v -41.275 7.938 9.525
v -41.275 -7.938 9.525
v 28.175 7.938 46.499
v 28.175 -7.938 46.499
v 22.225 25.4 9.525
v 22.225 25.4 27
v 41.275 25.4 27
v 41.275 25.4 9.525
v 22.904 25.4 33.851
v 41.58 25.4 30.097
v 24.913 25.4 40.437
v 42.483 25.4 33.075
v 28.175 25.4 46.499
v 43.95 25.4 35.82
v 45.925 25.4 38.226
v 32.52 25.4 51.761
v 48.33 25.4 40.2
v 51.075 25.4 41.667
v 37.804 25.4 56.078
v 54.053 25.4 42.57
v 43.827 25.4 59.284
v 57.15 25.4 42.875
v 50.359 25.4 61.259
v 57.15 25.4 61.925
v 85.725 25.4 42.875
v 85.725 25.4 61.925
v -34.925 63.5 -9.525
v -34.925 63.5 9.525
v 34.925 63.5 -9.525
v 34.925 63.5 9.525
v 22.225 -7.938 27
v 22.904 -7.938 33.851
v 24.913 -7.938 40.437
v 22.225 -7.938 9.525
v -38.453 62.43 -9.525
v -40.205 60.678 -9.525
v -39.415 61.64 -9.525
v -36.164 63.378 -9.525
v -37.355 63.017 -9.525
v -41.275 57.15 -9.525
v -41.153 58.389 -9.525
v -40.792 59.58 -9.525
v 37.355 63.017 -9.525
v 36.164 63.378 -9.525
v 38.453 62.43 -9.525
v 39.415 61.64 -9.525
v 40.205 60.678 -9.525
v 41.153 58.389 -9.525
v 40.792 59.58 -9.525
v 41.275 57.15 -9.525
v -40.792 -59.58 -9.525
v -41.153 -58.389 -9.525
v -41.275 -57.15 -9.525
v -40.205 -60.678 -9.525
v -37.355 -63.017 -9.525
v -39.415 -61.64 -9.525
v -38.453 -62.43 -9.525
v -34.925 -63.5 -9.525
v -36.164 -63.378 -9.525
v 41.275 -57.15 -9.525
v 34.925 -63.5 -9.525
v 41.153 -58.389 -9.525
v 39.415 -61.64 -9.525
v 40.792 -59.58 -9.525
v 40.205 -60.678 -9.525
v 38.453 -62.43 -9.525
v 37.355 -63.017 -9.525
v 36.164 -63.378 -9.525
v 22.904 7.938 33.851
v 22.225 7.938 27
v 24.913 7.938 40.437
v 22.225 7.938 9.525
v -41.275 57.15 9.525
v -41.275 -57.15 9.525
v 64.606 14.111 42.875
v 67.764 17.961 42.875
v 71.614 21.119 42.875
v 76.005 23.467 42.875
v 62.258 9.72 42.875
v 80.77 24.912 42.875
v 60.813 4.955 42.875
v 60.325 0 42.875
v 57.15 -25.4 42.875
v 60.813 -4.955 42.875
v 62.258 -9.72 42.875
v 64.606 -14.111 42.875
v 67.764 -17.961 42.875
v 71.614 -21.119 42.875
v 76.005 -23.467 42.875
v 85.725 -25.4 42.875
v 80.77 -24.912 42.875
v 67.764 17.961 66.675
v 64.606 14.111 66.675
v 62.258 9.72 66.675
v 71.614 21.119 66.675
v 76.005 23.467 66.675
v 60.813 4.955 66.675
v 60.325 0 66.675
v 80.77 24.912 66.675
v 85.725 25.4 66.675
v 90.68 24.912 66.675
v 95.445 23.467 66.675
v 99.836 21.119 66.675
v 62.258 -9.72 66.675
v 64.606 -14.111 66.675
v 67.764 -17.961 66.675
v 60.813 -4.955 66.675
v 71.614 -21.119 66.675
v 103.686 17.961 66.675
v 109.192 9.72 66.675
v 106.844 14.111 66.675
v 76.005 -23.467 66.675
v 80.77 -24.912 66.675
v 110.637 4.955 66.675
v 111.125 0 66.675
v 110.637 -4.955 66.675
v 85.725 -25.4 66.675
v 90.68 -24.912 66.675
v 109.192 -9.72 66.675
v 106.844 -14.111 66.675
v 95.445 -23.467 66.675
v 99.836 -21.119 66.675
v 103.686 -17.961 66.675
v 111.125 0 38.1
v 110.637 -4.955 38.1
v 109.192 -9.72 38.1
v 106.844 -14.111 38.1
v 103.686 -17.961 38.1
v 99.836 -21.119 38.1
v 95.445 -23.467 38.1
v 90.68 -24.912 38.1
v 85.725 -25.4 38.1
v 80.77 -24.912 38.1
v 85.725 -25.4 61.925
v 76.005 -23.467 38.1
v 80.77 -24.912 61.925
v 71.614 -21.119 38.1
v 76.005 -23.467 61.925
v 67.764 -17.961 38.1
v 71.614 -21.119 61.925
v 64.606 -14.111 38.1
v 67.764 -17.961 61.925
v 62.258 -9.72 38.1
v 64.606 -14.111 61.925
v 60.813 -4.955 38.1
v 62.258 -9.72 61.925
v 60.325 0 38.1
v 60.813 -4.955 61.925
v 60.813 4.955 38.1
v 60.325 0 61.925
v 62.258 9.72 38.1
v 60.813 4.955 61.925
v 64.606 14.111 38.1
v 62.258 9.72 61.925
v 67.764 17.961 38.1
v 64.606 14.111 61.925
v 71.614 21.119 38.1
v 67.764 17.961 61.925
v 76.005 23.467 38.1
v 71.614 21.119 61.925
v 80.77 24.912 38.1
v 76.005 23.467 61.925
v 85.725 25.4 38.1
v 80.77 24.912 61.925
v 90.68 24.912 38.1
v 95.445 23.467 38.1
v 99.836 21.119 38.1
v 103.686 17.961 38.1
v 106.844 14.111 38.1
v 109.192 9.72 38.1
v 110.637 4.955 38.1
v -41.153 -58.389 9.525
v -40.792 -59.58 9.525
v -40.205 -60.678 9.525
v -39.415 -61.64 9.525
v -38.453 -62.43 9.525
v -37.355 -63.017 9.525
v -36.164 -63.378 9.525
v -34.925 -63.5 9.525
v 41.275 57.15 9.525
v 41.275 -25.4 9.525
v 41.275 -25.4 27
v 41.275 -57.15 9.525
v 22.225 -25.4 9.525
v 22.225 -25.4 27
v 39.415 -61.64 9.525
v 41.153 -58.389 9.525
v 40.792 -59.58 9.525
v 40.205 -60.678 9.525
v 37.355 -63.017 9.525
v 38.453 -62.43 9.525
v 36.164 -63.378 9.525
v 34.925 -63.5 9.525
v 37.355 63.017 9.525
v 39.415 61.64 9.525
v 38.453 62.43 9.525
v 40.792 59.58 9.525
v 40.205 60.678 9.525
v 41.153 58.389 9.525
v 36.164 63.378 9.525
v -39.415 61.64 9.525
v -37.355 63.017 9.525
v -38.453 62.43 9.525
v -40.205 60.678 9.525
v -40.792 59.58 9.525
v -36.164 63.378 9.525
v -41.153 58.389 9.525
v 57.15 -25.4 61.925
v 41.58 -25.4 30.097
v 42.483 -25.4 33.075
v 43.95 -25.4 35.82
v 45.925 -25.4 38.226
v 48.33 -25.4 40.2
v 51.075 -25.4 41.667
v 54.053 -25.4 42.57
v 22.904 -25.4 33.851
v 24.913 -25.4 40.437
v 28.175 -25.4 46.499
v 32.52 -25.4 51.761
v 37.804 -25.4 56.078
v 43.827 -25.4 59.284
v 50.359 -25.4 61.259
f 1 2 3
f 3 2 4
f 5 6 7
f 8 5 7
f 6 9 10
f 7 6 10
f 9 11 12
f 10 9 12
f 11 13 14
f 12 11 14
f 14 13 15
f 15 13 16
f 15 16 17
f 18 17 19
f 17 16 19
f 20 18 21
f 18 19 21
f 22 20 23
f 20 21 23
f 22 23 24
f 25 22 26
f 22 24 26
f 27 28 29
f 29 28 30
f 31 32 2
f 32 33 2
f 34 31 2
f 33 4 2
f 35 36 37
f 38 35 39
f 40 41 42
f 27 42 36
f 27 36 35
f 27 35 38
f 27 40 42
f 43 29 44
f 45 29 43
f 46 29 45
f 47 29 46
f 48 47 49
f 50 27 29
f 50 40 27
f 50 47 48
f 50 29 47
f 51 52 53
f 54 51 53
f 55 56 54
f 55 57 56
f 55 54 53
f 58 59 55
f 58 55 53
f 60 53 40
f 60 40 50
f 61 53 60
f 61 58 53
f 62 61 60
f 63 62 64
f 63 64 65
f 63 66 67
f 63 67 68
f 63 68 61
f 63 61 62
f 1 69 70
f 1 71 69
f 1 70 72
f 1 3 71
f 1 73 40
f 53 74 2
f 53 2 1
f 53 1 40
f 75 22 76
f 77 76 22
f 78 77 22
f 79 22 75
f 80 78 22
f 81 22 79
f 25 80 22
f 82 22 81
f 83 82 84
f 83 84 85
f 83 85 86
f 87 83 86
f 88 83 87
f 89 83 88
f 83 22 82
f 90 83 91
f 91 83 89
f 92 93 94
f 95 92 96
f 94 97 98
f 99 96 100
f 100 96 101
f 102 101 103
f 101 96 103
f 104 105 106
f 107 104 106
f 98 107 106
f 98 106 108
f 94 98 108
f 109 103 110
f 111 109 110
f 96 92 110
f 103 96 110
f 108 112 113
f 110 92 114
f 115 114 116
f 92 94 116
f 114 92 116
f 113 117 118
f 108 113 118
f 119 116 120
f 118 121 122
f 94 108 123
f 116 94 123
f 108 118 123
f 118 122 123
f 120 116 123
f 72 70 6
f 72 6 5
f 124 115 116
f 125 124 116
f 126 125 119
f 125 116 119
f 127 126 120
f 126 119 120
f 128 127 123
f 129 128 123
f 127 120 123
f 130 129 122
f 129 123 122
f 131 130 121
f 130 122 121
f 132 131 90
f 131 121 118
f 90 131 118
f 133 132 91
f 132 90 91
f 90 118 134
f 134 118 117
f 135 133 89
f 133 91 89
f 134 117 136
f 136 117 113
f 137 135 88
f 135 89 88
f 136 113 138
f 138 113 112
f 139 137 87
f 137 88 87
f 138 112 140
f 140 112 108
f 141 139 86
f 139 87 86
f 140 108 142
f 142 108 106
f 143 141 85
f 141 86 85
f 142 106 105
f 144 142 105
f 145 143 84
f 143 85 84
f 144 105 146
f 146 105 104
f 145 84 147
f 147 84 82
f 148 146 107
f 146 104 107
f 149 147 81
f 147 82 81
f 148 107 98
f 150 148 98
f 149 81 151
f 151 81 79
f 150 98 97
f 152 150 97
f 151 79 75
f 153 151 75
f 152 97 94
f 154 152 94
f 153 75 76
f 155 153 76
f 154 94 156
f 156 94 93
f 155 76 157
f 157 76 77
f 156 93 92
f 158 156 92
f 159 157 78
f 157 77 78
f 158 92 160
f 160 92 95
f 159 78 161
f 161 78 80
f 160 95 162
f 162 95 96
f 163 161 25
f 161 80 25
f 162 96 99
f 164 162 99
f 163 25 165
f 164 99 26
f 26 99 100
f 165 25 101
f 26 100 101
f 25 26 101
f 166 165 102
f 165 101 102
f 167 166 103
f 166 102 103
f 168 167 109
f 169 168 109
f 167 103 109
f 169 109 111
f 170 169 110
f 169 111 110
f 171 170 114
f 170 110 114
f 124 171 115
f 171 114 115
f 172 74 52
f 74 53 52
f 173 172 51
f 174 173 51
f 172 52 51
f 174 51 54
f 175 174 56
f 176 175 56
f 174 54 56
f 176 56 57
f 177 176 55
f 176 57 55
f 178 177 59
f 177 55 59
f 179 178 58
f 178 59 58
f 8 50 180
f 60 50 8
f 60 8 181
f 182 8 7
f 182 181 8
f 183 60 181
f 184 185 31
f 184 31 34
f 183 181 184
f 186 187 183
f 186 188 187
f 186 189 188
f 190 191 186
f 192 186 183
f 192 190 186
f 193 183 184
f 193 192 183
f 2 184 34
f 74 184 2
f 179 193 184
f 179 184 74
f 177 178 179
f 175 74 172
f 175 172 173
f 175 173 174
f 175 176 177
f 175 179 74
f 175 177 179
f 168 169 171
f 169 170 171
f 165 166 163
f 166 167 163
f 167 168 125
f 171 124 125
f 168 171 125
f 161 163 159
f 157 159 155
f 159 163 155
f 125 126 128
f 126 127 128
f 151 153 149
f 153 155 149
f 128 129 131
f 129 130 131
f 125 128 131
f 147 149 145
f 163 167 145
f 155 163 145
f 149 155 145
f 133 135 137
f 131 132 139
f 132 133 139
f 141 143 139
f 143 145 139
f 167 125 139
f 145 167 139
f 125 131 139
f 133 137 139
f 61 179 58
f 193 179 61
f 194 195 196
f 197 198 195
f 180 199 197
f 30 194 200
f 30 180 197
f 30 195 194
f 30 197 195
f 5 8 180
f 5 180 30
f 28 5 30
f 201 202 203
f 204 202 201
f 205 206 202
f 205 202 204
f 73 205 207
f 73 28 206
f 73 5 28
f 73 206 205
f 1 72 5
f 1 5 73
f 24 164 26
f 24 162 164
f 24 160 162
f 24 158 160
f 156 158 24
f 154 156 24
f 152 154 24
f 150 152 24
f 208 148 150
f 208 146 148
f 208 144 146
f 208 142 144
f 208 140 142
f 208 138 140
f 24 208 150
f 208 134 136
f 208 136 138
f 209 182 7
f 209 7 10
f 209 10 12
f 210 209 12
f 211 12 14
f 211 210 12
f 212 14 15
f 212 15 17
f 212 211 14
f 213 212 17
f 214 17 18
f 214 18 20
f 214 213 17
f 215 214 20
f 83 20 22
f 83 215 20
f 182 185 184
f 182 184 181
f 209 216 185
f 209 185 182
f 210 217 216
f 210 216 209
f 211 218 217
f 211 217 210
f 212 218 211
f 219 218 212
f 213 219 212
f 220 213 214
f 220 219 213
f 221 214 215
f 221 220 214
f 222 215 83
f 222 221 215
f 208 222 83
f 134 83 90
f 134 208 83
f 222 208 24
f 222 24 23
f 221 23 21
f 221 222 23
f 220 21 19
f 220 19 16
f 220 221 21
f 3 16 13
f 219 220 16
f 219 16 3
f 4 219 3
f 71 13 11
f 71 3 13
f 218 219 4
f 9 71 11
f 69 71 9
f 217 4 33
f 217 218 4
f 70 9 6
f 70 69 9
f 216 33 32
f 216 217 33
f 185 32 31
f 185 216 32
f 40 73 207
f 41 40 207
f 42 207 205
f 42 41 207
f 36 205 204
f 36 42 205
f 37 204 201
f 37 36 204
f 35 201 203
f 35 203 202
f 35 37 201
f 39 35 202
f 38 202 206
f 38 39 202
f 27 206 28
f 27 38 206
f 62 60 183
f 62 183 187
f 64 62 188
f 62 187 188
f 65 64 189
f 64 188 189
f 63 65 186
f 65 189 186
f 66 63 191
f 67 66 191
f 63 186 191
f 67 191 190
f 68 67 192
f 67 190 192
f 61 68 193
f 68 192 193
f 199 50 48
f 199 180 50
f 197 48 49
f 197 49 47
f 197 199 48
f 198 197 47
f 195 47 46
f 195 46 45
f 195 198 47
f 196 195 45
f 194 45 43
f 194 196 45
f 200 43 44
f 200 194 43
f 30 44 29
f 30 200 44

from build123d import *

# Parameters (mm, degrees)
F1_DEPTH = 63.5
F2_DEPTH = 25.4
F3_DEPTH = 7.9375
F5_R     = 6.35


with BuildPart() as f1:
    # F0 (on Front) → F1 (new body, symmetric)
    with BuildSketch(Plane.XZ):
        Polygon((22.225, 9.525), (-41.275, 9.525), (-41.275, -9.525), (41.275, -9.525), (41.275, 9.525), align=None)
    extrude(amount=F1_DEPTH, both=True)

    # F0 (on Front) → F2 (join, symmetric)
    with BuildSketch(Plane.XZ):
        Polygon((85.725, 61.9252), (60.325, 61.9252), (60.325, 42.8752), (80.5717907127, 42.8752), (85.725, 42.8752), align=None)
        with BuildLine():
            Line((22.225, 27.0002), (22.225, 9.525))
            Line((22.225, 9.525), (41.275, 9.525))
            Line((41.275, 9.525), (41.275, 27.0002))
            ThreePointArc((41.275, 27.0002), (45.9246798487, 38.2255201513), (57.15, 42.8752))
            Line((57.15, 42.8752), (60.325, 42.8752))
            Line((60.325, 42.8752), (60.325, 61.9252))
            Line((60.325, 61.9252), (57.15, 61.9252))
            add(Edge.make_bspline(
                [(28.1752493255, 46.4994166087), (37.8334995503, 51.6413444058), (47.4917497752, 56.7832722029), (57.15, 61.9252)],
                knots=[78.6793785876, 78.6793785876, 78.6793785876, 78.6793785876, 111.5045361635, 111.5045361635, 111.5045361635, 111.5045361635], degree=3))
            ThreePointArc((28.1752493255, 46.4994166087), (23.7456680032, 37.1936404813), (22.225, 27.0002))
        make_face()
        with BuildLine():
            ThreePointArc((57.15, 61.9252), (40.737421212, 57.8284805639), (28.1752493255, 46.4994166087))
            add(Edge.make_bspline(
                [(28.1752493255, 46.4994166087), (37.8334995503, 51.6413444058), (47.4917497752, 56.7832722029), (57.15, 61.9252)],
                knots=[78.6793785876, 78.6793785876, 78.6793785876, 78.6793785876, 111.5045361635, 111.5045361635, 111.5045361635, 111.5045361635], degree=3))
        make_face()
    extrude(amount=F2_DEPTH, both=True)

    # F0 (on Front) → F3 (join, symmetric)
    with BuildSketch(Plane.XZ):
        with BuildLine():
            add(Edge.make_bspline(
                [(-41.275, 9.525), (-18.1249168915, 21.8498055362), (5.025166217, 34.1746110724), (28.1752493255, 46.4994166087)],
                knots=[0, 0, 0, 0, 78.6793785876, 78.6793785876, 78.6793785876, 78.6793785876], degree=3))
            Line((-41.275, 9.525), (22.225, 9.525))
            Line((22.225, 9.525), (22.225, 27.0002))
            ThreePointArc((22.225, 27.0002), (23.7456680032, 37.1936404813), (28.1752493255, 46.4994166087))
        make_face()
    extrude(amount=F3_DEPTH, both=True)

    # F0 (on Front) → F4 (revolve)
    with BuildSketch(Plane.XZ):
        Polygon((85.725, 66.675), (85.725, 61.9252), (85.725, 42.8752), (85.725, 38.1), (111.125, 38.1), (111.125, 66.675), align=None)
    revolve(axis=Axis((85.725, 0, 52.3875), (0, 0, -1)))

    # F5
    f5_edges = [f1.edges().sort_by_distance(p)[0] for p in [
        (-41.275, -63.5, 0),
        (41.275, -63.5, 0),
        (41.275, 63.5, 0),
        (-41.275, 63.5, 0),
    ]]
    fillet(f5_edges, radius=F5_R)


solid = f1.part
